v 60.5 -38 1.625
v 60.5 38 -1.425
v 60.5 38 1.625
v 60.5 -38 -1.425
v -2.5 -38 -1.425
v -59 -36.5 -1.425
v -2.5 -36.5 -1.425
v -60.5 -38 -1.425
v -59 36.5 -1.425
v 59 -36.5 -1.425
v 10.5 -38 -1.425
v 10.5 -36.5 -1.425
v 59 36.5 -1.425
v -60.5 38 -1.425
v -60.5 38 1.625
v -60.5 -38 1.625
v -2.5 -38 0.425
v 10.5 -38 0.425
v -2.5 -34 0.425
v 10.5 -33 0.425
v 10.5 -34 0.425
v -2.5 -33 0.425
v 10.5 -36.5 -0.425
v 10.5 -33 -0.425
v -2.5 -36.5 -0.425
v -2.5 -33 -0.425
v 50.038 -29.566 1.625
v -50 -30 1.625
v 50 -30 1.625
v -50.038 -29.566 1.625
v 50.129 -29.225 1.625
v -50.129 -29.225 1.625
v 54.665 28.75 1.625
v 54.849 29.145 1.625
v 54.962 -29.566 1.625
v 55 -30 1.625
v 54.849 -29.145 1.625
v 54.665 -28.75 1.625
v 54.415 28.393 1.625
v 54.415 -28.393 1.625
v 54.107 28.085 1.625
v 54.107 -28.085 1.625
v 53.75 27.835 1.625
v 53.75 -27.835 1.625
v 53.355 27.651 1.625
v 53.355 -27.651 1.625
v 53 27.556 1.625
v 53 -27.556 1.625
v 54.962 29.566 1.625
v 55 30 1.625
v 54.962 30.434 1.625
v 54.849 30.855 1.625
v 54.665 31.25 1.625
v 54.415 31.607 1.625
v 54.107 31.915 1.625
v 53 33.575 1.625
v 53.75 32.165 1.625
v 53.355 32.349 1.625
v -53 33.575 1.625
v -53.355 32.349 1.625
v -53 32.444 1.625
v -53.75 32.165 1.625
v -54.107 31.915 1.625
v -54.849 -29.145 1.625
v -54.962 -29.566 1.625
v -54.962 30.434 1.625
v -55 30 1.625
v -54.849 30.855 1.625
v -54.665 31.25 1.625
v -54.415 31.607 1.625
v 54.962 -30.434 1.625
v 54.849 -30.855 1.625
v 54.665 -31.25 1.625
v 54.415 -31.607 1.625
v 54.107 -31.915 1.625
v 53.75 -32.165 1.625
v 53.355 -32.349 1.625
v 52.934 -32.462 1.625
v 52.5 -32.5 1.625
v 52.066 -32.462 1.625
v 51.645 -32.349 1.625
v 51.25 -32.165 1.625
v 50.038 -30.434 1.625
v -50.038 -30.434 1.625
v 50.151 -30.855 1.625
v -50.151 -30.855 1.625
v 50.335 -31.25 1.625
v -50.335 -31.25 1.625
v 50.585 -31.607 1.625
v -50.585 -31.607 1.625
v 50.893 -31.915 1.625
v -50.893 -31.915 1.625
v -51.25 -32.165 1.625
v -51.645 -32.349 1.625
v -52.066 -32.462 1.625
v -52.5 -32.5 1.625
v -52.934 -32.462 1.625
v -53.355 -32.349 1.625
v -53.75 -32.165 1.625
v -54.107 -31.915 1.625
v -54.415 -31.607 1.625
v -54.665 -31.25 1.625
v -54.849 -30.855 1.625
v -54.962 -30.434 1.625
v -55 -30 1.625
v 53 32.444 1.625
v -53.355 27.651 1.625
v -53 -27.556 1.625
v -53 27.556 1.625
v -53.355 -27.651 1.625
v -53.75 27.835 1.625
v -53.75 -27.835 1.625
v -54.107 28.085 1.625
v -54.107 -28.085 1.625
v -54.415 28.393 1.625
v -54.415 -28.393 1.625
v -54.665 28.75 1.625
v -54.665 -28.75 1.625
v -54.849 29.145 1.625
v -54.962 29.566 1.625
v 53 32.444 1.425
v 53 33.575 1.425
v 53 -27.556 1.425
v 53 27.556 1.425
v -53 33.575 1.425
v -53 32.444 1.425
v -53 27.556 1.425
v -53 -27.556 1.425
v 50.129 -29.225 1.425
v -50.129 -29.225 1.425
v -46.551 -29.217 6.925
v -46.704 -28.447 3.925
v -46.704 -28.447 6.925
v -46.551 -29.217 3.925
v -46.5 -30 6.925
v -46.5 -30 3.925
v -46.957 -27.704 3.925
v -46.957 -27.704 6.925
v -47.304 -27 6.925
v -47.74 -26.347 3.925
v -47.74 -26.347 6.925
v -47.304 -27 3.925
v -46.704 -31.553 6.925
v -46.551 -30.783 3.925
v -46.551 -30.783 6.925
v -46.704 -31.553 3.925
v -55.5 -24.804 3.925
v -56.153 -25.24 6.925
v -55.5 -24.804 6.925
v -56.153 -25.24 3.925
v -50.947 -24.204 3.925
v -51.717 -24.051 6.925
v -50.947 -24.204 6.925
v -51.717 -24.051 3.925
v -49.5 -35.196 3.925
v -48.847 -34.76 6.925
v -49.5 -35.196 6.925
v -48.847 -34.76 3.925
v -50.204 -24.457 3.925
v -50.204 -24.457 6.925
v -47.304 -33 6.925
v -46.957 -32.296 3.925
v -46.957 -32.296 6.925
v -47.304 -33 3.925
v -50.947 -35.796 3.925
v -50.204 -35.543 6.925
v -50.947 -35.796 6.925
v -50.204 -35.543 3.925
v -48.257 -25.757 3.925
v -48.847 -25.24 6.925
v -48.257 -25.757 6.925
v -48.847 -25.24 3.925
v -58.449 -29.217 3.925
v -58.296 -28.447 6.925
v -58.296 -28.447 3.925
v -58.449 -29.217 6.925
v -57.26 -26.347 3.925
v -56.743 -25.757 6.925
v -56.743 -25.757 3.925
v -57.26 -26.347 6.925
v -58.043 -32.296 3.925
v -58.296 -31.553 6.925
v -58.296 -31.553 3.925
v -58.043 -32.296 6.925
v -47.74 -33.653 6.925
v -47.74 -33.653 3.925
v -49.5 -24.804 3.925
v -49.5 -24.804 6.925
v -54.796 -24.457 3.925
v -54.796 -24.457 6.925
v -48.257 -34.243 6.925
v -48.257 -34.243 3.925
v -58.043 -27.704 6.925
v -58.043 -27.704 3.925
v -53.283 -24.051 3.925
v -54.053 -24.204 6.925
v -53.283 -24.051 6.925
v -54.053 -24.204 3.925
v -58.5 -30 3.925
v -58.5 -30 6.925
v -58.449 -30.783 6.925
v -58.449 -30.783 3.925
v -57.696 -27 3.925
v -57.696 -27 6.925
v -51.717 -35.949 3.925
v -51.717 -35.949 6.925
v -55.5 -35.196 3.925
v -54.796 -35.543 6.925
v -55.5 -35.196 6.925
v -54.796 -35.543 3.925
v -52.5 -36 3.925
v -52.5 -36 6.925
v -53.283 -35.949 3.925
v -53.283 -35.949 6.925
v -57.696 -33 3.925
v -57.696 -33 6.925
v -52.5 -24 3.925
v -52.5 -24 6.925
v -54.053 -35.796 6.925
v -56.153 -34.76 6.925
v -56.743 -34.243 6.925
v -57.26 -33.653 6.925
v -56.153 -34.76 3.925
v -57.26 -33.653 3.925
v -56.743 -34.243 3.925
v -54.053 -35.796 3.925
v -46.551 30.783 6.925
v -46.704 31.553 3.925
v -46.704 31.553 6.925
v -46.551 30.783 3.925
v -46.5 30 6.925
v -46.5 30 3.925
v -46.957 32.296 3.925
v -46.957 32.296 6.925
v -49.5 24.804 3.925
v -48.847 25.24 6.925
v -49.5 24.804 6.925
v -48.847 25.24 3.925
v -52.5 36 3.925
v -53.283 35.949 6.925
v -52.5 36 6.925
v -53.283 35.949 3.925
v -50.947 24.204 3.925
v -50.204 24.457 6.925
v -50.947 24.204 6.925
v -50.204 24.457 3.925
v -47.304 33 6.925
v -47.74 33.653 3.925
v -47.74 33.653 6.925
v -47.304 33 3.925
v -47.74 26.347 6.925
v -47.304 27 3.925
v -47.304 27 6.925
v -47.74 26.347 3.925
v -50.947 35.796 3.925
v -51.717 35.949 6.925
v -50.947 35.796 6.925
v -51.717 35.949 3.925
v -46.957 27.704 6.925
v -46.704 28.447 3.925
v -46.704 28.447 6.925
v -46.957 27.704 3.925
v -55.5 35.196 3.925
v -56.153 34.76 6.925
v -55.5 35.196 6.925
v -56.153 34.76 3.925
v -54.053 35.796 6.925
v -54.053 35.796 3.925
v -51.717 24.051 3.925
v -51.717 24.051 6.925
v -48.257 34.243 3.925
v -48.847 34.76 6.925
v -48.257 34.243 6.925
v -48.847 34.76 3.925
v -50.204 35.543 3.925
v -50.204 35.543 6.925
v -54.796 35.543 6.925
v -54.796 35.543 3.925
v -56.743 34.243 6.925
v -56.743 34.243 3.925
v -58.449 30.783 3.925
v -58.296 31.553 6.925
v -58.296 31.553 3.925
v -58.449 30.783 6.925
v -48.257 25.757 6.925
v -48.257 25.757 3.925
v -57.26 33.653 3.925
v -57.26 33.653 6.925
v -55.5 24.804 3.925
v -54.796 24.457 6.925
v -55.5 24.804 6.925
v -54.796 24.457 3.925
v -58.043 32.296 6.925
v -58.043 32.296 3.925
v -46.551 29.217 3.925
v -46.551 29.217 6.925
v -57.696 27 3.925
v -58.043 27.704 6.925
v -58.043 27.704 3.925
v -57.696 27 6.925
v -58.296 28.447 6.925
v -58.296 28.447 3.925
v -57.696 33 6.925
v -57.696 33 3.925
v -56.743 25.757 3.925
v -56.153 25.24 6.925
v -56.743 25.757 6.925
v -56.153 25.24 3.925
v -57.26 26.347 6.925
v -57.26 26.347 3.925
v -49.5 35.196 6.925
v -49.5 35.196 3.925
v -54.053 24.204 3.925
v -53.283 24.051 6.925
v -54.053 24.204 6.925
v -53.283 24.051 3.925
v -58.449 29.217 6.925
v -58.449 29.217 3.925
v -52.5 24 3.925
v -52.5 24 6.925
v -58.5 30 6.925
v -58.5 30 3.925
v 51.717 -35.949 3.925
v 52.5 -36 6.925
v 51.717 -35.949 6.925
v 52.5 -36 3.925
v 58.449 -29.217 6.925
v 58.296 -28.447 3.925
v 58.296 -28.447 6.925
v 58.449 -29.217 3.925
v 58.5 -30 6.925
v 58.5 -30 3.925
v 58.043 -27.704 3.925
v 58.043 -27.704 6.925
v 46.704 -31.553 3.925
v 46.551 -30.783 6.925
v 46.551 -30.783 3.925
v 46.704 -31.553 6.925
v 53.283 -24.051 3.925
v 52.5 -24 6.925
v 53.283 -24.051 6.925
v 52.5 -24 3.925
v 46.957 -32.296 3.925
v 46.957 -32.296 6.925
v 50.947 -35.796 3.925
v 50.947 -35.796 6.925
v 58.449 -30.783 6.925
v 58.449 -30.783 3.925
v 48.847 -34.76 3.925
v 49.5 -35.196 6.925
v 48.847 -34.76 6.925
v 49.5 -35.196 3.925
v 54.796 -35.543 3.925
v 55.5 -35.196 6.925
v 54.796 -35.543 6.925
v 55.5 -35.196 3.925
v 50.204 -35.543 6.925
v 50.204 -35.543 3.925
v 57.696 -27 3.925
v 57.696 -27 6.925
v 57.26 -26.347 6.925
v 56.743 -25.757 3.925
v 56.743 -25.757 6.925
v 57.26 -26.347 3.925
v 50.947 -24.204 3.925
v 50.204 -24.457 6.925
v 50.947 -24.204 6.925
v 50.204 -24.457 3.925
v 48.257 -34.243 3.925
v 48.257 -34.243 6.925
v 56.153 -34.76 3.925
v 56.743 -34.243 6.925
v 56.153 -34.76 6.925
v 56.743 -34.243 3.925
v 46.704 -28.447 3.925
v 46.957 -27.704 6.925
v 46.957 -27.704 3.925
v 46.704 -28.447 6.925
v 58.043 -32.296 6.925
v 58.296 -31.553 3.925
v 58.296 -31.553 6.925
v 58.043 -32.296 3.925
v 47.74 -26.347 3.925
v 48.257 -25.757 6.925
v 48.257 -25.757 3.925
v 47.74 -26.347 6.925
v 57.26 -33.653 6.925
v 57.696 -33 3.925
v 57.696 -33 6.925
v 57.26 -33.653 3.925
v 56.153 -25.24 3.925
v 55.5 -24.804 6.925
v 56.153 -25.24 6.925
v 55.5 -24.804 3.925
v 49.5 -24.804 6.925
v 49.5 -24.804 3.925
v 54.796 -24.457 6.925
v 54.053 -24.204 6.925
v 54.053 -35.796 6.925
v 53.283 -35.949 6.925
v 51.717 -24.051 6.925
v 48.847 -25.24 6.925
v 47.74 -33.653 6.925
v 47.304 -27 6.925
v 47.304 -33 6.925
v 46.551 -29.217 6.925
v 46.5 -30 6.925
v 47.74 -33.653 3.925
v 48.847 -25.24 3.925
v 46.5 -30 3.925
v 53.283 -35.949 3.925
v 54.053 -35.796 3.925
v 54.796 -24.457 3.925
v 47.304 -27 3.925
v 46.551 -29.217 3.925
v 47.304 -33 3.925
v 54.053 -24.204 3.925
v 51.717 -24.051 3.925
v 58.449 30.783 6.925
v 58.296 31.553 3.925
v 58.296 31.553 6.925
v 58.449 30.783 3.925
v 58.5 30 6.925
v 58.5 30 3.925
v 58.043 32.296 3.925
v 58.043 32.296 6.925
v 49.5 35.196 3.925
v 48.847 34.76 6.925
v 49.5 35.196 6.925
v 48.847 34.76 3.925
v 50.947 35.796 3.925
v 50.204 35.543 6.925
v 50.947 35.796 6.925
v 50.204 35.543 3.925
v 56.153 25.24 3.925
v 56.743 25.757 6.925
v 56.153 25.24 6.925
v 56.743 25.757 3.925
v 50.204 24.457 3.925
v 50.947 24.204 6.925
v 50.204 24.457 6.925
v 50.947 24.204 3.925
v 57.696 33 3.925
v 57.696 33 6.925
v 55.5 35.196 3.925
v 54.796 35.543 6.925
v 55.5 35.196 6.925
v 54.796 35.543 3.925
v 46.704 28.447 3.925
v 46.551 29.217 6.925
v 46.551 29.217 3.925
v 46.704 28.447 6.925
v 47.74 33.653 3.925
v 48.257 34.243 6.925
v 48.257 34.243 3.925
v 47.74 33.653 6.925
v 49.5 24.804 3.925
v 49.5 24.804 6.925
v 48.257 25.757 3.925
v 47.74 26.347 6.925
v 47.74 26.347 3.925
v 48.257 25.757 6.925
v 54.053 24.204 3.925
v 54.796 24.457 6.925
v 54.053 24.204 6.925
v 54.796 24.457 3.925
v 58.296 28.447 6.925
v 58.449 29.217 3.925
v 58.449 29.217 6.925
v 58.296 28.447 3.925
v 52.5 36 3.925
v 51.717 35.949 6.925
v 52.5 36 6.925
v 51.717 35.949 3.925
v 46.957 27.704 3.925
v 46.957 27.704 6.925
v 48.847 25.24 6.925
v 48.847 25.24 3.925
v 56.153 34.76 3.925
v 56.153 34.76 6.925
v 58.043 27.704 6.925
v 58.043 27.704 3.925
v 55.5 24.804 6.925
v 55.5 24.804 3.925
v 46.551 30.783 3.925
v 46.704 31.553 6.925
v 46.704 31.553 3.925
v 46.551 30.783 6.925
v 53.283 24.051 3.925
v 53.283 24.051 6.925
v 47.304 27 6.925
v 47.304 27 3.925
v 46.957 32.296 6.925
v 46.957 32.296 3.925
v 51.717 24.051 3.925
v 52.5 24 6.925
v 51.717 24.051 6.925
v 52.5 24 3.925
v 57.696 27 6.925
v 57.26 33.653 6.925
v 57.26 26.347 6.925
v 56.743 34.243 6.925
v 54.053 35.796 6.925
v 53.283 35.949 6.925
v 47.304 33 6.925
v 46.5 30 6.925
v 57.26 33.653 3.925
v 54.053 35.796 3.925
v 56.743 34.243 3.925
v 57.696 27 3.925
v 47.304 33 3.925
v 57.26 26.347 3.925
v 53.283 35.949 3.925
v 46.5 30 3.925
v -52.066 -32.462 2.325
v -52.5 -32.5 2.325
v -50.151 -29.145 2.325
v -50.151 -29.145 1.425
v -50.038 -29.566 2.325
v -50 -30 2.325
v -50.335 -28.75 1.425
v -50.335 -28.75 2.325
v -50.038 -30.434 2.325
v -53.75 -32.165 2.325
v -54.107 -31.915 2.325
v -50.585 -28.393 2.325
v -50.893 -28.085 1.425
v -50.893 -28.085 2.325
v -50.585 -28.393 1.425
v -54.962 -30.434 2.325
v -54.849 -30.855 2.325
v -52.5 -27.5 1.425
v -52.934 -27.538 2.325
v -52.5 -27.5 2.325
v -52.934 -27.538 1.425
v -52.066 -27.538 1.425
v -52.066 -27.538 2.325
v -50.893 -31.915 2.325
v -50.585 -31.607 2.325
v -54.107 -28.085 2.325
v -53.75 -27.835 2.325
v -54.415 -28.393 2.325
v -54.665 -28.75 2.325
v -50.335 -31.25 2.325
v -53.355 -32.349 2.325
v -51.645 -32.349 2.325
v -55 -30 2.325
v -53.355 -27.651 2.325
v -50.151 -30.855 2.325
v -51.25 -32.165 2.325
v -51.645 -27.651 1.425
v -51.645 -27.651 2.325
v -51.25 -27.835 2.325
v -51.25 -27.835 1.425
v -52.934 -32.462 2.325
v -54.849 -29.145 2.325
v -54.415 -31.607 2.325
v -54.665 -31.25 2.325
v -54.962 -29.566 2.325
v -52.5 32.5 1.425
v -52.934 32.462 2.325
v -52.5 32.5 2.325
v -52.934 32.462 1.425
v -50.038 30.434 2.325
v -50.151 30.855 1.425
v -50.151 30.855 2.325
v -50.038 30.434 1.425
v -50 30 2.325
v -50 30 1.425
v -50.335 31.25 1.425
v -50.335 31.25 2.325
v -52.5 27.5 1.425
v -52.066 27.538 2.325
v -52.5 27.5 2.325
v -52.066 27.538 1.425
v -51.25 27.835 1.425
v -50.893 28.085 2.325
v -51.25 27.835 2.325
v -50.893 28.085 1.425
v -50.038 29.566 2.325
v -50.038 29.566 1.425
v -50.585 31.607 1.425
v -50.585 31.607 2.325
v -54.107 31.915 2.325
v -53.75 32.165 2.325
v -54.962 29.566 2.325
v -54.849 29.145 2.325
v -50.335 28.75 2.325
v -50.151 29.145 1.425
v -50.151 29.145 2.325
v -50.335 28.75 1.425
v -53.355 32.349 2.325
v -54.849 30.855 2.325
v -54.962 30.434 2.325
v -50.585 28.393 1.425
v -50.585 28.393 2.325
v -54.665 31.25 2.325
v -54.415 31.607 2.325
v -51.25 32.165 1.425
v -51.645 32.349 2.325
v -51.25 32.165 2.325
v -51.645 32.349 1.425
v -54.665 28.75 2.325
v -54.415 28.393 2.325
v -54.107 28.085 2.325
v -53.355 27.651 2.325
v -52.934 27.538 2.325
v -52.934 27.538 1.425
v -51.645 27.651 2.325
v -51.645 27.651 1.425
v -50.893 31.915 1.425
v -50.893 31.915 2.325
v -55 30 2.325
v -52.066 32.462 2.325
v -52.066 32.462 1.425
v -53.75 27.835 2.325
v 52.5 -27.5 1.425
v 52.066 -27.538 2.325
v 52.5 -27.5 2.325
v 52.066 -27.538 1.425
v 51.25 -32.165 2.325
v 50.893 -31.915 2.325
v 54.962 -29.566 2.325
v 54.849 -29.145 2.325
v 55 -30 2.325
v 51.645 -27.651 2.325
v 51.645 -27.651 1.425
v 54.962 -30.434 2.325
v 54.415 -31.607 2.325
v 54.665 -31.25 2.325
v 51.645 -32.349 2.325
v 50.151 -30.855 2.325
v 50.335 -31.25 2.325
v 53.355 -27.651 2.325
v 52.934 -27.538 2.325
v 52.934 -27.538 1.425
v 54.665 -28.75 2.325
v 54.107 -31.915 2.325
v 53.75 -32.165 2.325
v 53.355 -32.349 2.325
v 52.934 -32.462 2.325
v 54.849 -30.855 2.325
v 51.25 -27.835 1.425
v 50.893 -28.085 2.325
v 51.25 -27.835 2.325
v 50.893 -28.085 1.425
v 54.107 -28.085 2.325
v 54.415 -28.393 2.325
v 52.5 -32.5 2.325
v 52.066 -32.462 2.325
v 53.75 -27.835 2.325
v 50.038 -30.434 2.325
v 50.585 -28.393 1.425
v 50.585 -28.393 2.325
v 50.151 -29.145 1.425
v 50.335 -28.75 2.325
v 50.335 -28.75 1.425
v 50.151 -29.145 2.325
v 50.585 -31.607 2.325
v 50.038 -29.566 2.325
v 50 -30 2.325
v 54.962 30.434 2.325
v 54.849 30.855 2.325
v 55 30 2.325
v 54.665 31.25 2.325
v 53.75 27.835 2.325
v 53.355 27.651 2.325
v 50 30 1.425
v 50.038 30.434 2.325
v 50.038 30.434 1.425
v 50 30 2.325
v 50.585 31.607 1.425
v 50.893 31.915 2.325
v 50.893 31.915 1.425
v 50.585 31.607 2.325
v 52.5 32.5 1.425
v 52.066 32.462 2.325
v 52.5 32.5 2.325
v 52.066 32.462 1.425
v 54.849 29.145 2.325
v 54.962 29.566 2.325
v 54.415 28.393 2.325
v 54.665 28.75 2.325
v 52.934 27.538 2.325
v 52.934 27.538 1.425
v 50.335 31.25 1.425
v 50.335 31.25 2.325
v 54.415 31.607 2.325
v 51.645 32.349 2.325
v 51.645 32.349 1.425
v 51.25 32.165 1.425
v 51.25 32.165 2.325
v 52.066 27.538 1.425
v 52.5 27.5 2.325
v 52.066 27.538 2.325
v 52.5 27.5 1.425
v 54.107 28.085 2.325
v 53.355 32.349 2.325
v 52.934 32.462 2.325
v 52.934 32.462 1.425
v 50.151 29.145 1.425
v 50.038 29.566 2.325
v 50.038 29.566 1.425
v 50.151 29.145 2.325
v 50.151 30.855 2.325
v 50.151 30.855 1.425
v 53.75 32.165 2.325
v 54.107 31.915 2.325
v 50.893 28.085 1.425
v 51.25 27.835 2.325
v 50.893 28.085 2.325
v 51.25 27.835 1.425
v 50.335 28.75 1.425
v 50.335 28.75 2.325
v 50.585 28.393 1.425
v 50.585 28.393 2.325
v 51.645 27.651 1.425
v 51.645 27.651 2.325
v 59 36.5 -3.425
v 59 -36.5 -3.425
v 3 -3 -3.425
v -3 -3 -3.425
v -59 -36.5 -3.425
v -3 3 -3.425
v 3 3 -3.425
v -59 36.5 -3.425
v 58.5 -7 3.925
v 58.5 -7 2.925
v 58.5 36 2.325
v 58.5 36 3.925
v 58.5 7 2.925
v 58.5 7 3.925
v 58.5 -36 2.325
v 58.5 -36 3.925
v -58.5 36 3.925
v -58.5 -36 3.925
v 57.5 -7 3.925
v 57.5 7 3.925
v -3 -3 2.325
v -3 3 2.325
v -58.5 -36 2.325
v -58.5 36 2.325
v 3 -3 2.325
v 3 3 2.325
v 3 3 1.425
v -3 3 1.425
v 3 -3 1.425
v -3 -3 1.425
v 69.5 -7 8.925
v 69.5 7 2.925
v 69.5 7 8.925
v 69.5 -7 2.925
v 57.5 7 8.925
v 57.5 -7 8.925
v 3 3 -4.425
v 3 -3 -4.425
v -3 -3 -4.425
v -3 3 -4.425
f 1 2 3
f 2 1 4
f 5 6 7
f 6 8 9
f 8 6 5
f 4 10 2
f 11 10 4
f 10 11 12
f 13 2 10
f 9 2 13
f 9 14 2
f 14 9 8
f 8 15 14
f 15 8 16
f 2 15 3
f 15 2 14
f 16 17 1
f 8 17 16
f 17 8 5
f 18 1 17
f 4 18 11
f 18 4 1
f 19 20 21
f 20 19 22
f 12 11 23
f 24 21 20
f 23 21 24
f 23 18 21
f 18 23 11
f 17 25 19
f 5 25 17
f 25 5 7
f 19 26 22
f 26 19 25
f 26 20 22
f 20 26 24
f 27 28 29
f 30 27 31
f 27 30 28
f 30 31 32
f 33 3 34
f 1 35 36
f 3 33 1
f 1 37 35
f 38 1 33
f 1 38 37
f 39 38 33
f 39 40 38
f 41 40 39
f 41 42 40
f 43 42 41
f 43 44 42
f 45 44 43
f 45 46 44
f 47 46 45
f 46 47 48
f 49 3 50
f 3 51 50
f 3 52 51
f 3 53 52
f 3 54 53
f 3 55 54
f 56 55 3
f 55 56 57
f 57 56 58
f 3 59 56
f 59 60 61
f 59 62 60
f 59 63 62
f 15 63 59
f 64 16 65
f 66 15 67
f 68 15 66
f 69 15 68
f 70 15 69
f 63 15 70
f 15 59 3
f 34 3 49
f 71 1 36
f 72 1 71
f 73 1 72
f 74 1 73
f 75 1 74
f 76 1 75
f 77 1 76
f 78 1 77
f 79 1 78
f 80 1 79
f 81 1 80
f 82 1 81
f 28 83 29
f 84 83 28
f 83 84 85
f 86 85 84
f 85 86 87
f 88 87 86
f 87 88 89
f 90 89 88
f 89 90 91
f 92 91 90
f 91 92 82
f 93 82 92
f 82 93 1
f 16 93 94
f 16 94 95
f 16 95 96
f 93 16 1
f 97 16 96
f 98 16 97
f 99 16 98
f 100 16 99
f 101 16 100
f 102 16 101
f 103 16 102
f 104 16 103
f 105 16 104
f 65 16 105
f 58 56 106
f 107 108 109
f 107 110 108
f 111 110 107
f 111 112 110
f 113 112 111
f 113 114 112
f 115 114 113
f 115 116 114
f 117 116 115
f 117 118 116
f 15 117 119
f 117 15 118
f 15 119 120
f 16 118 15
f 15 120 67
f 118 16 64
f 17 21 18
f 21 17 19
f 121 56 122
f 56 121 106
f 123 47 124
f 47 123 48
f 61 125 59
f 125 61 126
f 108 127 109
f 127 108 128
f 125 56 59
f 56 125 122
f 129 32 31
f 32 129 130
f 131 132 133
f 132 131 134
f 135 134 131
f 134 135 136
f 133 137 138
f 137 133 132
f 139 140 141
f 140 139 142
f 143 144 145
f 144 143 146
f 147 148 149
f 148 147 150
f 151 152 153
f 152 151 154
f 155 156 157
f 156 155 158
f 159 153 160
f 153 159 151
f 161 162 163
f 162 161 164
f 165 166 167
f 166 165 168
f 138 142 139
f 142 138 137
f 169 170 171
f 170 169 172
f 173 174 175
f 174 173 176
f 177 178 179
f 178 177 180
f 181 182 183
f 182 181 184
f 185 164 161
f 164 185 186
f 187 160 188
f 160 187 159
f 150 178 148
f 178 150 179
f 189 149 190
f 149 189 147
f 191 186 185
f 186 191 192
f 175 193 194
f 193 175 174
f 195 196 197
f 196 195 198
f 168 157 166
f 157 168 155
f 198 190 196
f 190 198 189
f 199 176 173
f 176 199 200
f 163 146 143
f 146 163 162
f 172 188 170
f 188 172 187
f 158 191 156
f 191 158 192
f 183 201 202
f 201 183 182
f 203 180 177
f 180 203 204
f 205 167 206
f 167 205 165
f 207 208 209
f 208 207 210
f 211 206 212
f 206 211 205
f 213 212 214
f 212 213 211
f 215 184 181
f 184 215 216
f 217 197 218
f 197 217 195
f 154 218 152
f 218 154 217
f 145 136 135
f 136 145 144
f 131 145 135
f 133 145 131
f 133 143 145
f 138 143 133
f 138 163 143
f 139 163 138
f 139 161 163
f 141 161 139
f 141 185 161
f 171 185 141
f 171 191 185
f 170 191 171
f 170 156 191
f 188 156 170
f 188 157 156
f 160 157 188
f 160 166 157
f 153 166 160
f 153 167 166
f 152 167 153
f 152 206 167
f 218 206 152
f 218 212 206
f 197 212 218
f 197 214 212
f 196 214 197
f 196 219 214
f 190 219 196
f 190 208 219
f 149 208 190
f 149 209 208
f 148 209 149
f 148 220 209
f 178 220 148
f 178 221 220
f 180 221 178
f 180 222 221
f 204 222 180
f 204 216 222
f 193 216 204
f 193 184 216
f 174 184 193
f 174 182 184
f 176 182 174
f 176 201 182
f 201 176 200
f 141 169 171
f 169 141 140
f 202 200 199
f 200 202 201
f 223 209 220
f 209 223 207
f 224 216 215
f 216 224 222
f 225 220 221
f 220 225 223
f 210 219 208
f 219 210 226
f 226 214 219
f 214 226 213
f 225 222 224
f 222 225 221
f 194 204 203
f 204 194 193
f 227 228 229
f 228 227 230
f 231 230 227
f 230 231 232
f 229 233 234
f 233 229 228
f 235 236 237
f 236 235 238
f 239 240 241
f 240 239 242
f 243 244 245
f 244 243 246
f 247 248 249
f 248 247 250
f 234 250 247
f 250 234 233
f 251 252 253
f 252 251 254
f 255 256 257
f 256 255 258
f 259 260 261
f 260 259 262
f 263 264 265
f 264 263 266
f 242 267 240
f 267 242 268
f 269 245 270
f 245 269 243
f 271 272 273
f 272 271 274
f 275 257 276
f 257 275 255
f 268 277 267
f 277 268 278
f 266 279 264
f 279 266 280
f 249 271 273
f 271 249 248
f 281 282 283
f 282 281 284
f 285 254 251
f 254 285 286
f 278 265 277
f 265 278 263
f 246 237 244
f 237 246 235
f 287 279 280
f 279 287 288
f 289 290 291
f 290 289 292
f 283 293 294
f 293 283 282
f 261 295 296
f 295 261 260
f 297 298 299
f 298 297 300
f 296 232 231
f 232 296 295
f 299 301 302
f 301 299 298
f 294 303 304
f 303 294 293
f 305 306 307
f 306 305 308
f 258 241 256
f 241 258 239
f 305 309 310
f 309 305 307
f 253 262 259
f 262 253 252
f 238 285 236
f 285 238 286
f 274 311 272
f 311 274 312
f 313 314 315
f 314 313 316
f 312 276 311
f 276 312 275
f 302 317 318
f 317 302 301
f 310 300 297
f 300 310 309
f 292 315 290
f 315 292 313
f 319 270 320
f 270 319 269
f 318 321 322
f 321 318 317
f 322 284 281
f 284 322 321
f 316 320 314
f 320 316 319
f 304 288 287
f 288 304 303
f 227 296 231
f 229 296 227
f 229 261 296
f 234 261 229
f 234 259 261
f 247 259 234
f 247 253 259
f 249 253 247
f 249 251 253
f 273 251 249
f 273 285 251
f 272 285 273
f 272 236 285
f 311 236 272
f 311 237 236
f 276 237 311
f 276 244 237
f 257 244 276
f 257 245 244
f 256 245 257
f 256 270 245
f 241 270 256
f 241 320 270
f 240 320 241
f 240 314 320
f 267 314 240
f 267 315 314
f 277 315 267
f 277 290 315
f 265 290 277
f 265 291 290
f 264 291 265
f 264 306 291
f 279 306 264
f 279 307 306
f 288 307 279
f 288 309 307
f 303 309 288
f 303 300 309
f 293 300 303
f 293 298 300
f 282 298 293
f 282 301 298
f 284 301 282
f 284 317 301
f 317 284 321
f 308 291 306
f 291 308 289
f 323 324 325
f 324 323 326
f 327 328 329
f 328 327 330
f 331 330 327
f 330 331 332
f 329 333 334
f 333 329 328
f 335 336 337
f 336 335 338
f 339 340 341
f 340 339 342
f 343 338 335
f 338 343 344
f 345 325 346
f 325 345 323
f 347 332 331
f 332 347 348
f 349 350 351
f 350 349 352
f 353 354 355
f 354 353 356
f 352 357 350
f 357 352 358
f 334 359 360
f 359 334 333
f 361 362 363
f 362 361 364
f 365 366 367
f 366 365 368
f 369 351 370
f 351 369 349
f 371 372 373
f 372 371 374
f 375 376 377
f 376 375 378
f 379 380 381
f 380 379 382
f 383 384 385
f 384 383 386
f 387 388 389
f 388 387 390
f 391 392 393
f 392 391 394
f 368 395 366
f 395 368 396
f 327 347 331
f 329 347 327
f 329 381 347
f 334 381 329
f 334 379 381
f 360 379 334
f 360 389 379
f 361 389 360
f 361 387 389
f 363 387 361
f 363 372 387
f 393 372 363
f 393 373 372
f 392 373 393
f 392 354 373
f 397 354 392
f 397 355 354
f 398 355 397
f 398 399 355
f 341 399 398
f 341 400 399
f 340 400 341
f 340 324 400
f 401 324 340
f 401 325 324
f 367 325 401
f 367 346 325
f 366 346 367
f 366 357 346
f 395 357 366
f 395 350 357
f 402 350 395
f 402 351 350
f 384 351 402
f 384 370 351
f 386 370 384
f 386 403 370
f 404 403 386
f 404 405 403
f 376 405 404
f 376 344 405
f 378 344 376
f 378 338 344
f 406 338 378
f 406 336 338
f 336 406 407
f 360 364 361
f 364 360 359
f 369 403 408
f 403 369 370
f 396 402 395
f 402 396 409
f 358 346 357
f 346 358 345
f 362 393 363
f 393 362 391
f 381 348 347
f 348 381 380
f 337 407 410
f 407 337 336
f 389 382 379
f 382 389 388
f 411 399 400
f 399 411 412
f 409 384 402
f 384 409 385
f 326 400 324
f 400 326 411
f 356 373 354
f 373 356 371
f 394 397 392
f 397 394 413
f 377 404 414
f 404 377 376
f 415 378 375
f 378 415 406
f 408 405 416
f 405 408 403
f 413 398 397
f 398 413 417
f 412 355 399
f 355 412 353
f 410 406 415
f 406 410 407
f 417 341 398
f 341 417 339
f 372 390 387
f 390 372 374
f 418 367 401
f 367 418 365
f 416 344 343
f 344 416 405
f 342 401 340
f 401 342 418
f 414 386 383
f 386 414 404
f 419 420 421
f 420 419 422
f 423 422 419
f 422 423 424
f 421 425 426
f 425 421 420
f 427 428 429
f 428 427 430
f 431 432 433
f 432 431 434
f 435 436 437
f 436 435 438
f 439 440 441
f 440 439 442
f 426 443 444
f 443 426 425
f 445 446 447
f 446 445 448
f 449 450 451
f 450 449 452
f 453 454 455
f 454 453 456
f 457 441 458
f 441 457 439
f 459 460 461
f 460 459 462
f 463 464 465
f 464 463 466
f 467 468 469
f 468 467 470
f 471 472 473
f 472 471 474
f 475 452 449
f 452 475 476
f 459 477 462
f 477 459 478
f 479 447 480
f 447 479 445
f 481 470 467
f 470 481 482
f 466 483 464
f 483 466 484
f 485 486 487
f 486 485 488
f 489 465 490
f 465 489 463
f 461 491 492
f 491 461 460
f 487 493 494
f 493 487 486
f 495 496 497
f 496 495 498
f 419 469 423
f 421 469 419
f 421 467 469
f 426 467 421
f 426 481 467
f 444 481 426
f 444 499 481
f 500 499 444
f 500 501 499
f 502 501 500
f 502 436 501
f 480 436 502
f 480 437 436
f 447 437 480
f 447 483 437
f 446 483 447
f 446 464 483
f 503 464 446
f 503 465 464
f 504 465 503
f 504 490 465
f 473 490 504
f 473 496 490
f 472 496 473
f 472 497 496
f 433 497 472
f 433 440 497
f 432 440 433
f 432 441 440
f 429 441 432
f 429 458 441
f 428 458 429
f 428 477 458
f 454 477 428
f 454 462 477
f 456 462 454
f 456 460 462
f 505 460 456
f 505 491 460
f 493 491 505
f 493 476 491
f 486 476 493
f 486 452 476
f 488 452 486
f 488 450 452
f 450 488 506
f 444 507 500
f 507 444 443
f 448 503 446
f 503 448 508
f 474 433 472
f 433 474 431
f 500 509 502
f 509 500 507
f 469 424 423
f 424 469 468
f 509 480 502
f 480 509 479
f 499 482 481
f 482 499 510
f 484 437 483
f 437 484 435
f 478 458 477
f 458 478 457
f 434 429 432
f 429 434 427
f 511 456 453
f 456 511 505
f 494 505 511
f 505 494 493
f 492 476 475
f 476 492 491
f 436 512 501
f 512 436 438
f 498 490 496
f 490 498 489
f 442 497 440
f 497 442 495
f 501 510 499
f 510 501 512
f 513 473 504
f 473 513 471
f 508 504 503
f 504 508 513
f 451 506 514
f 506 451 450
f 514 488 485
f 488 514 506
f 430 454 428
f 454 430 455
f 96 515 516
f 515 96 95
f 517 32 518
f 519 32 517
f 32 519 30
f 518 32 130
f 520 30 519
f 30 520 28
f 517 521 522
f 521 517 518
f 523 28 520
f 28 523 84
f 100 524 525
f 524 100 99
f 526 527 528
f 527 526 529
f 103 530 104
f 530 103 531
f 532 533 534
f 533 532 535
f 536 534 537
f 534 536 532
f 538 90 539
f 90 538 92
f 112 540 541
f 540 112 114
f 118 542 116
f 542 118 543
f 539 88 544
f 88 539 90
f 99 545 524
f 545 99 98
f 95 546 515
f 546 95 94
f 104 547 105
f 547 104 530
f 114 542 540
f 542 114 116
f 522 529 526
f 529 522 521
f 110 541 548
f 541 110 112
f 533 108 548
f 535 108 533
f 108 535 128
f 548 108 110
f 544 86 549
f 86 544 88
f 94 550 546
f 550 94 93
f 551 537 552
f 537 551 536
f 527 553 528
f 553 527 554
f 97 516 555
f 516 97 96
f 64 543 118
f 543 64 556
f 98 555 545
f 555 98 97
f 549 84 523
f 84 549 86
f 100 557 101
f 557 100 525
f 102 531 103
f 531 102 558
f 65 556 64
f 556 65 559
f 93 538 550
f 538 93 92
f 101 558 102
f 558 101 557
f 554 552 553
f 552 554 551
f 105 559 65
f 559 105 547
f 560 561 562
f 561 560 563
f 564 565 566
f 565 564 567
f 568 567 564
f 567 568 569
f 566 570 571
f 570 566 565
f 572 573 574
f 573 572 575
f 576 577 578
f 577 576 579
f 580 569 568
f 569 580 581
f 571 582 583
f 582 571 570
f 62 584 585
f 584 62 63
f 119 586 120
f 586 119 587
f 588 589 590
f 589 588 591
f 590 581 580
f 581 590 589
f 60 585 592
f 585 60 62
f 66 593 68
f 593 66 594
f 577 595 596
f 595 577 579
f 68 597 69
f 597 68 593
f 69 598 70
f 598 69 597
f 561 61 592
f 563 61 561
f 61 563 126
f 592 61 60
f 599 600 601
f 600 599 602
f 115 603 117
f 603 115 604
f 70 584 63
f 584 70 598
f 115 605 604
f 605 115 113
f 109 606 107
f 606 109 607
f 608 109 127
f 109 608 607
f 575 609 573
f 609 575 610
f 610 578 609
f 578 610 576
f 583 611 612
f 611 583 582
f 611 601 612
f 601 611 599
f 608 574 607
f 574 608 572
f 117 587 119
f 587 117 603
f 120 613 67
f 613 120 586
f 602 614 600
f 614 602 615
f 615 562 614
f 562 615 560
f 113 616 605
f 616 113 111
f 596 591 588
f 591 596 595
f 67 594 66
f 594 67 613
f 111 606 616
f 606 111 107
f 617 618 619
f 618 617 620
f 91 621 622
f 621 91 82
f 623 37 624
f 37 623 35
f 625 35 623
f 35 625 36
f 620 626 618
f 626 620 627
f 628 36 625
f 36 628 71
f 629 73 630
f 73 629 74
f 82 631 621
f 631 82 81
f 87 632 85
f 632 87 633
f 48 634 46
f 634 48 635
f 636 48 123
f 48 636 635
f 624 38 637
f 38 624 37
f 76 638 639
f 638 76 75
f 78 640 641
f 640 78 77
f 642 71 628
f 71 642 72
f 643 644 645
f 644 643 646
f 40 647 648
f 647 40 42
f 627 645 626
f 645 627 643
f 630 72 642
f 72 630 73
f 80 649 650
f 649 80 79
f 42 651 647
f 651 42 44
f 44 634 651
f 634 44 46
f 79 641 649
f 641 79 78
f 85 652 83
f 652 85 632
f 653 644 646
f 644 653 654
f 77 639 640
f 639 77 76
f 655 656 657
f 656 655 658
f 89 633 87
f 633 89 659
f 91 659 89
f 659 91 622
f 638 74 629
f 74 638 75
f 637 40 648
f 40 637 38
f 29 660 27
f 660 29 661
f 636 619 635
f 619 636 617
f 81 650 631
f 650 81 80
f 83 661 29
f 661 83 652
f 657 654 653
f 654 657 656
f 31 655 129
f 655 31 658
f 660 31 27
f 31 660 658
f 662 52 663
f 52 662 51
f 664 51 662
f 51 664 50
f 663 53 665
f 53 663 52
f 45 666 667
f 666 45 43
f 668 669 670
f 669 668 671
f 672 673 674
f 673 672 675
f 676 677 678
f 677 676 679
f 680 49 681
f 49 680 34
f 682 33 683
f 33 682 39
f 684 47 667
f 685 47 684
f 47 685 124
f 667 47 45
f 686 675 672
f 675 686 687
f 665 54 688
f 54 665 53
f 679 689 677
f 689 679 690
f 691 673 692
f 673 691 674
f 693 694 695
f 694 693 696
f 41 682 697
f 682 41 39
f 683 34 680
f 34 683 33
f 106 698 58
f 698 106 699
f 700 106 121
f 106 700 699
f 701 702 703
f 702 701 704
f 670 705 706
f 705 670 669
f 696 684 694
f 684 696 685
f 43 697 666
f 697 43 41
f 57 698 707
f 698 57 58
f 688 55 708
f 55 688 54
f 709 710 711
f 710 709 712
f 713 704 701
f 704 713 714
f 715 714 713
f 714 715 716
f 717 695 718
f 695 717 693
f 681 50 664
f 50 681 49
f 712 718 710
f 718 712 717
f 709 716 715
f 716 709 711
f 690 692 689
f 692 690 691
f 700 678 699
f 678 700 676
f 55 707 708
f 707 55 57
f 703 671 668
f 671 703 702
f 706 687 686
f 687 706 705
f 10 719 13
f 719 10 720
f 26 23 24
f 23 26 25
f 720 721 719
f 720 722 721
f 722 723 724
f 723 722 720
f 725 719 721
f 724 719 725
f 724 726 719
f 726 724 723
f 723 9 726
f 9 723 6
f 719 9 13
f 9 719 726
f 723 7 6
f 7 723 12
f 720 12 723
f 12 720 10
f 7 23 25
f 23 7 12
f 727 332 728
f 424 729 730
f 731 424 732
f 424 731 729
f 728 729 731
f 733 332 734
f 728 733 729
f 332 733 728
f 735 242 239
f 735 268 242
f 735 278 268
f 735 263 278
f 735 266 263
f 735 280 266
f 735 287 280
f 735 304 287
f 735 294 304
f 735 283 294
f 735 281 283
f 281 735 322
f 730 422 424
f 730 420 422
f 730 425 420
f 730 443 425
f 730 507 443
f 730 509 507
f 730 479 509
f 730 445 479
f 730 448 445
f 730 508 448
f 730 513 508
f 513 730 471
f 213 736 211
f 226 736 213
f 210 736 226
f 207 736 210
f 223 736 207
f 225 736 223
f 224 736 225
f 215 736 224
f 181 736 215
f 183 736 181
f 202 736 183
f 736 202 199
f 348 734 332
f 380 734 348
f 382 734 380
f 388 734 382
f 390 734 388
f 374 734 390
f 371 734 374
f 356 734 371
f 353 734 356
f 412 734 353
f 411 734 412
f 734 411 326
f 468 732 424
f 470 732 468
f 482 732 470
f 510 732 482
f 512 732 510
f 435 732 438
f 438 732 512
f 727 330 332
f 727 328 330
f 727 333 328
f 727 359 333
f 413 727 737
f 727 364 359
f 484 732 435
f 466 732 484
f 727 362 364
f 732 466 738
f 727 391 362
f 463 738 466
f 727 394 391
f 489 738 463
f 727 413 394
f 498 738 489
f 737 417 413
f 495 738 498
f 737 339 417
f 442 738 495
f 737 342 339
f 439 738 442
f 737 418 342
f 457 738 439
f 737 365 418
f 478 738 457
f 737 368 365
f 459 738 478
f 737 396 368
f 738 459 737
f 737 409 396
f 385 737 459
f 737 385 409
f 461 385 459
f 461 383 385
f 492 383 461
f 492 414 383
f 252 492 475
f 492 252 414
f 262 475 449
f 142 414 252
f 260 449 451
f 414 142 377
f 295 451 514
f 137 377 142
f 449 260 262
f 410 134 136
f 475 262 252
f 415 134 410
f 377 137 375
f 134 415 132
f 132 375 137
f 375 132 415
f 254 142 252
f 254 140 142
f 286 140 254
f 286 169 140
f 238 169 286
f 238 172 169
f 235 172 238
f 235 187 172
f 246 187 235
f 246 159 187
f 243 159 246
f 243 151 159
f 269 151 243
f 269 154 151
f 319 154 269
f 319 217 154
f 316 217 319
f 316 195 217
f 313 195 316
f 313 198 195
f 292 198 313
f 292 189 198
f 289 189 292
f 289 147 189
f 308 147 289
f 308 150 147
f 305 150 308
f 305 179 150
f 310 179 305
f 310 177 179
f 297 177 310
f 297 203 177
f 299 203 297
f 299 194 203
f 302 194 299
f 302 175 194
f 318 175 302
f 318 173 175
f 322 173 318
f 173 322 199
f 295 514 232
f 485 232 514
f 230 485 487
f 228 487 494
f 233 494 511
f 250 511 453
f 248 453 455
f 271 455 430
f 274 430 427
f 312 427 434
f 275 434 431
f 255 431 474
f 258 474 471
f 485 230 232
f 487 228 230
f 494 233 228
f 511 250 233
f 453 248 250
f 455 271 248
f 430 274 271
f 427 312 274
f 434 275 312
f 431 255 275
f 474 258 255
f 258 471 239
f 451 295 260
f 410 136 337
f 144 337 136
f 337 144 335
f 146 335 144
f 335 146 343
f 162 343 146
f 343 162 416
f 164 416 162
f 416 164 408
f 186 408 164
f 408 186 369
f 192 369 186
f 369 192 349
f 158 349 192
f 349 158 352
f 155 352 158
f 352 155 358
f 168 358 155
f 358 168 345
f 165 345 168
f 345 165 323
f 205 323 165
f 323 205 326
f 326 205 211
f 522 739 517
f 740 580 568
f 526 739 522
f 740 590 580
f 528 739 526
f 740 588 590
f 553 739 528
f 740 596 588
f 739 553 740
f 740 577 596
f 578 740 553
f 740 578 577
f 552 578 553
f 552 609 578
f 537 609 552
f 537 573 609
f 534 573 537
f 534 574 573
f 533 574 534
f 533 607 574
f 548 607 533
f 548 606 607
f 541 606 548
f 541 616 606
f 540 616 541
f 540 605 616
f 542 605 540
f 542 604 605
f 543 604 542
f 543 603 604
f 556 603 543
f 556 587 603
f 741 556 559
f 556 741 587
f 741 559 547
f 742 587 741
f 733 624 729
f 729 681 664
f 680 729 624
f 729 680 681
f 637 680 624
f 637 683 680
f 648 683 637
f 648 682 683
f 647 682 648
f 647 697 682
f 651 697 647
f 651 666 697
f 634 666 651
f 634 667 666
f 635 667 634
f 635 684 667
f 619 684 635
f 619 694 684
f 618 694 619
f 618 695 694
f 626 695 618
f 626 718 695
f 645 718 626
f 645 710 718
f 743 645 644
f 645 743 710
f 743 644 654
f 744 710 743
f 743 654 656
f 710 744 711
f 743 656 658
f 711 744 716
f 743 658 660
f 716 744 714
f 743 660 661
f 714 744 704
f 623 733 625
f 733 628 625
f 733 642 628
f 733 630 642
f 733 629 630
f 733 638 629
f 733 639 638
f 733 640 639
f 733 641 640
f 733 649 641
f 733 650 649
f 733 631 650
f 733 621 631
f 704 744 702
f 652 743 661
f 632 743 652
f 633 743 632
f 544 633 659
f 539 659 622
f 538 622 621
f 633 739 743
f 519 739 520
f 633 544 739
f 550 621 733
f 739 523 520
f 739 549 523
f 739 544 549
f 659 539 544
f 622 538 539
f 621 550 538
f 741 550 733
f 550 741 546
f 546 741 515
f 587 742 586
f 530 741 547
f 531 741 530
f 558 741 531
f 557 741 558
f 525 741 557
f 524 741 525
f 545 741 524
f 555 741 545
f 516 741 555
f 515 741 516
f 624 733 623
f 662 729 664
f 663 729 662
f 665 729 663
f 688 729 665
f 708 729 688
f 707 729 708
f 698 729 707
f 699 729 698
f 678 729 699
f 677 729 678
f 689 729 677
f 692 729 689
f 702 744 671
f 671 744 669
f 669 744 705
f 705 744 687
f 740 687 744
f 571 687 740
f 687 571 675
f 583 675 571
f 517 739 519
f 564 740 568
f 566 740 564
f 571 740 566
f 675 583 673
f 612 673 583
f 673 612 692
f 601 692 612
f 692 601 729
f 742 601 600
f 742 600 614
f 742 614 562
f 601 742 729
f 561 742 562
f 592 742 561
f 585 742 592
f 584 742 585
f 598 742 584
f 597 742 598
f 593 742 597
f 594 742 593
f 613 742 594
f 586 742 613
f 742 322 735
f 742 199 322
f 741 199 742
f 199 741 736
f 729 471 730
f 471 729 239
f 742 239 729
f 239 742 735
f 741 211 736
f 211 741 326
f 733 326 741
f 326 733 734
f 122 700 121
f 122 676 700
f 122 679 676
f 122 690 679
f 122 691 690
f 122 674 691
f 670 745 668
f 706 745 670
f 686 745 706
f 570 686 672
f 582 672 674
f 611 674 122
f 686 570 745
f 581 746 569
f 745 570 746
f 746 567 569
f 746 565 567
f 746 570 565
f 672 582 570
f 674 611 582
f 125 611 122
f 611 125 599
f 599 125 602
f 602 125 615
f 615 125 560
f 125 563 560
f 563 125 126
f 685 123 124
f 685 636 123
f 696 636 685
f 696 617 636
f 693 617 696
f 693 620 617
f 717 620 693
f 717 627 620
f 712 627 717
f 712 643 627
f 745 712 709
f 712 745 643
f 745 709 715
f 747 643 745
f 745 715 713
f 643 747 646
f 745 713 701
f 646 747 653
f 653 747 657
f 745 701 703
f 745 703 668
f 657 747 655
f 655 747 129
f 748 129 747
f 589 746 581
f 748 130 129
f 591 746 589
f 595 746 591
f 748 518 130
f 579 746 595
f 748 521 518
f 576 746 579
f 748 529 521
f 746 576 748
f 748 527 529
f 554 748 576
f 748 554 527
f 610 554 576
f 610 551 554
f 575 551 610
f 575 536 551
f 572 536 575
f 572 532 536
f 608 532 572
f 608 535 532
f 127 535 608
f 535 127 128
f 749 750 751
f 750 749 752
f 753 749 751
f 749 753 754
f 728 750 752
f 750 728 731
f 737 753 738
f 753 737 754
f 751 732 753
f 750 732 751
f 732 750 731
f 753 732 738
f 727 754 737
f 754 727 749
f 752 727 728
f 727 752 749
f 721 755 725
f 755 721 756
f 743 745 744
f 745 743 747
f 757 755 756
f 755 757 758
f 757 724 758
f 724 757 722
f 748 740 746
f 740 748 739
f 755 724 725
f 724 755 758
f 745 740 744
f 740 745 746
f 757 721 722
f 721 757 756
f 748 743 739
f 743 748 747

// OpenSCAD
// HDMI display 5" module (ONE connected solid)
// Spec: 121, 76, 2.85, , [0, 0, 1.9], // pcb offst
//       [[-54, -30.225], [54, 34.575, 0.5]], // aperture
//       [[-58.7, -34], [58.7, 36.25, 1]], // touch screen
//       2, // thread length
//       [[-2.5, -39], [10.5, -33]], // clearance need for the ts ribbon

// ---------------- Parameters ----------------
display_overall_width_mm  = 121;
display_overall_height_mm = 76;
display_thickness_mm      = 2.85;

pcb_offset_x_mm = 0;
pcb_offset_y_mm = 0;
pcb_offset_z_mm = 1.9;

display_aperture_min_x_mm = -54;
display_aperture_min_y_mm = -30.225;
display_aperture_max_x_mm =  54;
display_aperture_max_y_mm =  34.575;
display_aperture_depth_mm = 0.5;

touch_min_x_mm = -58.7;
touch_min_y_mm = -34;
touch_max_x_mm =  58.7;
touch_max_y_mm =  36.25;
touch_thickness_mm = 1;

thread_length_mm = 2;

ts_ribbon_min_x_mm = -2.5;
ts_ribbon_min_y_mm = -39;
ts_ribbon_max_x_mm = 10.5;
ts_ribbon_max_y_mm = -33;
ts_ribbon_clearance_depth_mm = 2.5;

pcb_interface_thickness_mm = 1.6;
pcb_interface_margin_mm    = 2;

mount_post_radius_mm   = 2.5;
mount_post_inset_x_mm  = 8;
mount_post_inset_y_mm  = 8;

hdmi_width_mm  = 14;
hdmi_height_mm = 6;
hdmi_depth_mm  = 12;
hdmi_side_offset_y_mm = 0;

knob_radius_mm = 6;
knob_height_mm = 4;

overlap_mm = 1;

// Ensure the "display module" reads as a stack (not a single thin board)
backer_thickness_mm = 3.0;   // rear housing/backer (visual mass)
bezel_thickness_mm  = 1.2;   // front bezel ring thickness (around aperture)
bezel_lip_mm         = 1.0;  // bezel overlap into aperture opening

// ---------------- Helpers ----------------
function mid(a,b)  = (a+b)/2;
function span(a,b) = (b-a);

ap_cx = mid(display_aperture_min_x_mm, display_aperture_max_x_mm);
ap_cy = mid(display_aperture_min_y_mm, display_aperture_max_y_mm);
ap_w  = span(display_aperture_min_x_mm, display_aperture_max_x_mm);
ap_h  = span(display_aperture_min_y_mm, display_aperture_max_y_mm);

ts_cx = mid(touch_min_x_mm, touch_max_x_mm);
ts_cy = mid(touch_min_y_mm, touch_max_y_mm);
ts_w  = span(touch_min_x_mm, touch_max_x_mm);
ts_h  = span(touch_min_y_mm, touch_max_y_mm);

rb_cx = mid(ts_ribbon_min_x_mm, ts_ribbon_max_x_mm);
rb_cy = mid(ts_ribbon_min_y_mm, ts_ribbon_max_y_mm);
rb_w  = span(ts_ribbon_min_x_mm, ts_ribbon_max_x_mm);
rb_h  = span(ts_ribbon_min_y_mm, ts_ribbon_max_y_mm);

// Z stack (centered assembly around Z=0)
z_display_center = 0;
z_display_top    = z_display_center + display_thickness_mm/2;
z_display_bot    = z_display_center - display_thickness_mm/2;

z_touch_center = z_display_top + touch_thickness_mm/2 - overlap_mm;
z_touch_top    = z_touch_center + touch_thickness_mm/2;

z_pcb_center = z_display_top + pcb_offset_z_mm + pcb_interface_thickness_mm/2 - overlap_mm;
z_pcb_top    = z_pcb_center + pcb_interface_thickness_mm/2;
z_pcb_bot    = z_pcb_center - pcb_interface_thickness_mm/2;

z_knob_center = z_pcb_top + knob_height_mm/2 - overlap_mm;

z_backer_center = z_display_bot - backer_thickness_mm/2 + overlap_mm;
z_backer_bot    = z_backer_center - backer_thickness_mm/2;

z_bezel_center  = z_touch_top + bezel_thickness_mm/2 - overlap_mm;

// ---------------- Geometry modules ----------------
module display_core_with_recesses() {
  // Core slab with:
  // - aperture recess on front
  // - ribbon clearance pocket on front (per spec)
  difference() {
    cube([display_overall_width_mm, display_overall_height_mm, display_thickness_mm], center=true);

    // Aperture recess (front/top face)
    translate([ap_cx, ap_cy, z_display_top - display_aperture_depth_mm/2])
      cube([ap_w, ap_h, display_aperture_depth_mm + overlap_mm], center=true);

    // Ribbon clearance pocket (front/top face, near bottom edge per spec)
    translate([rb_cx, rb_cy, z_display_top - ts_ribbon_clearance_depth_mm/2])
      cube([rb_w, rb_h, ts_ribbon_clearance_depth_mm + overlap_mm], center=true);
  }
}

module front_bezel_ring() {
  // Bezel ring around the aperture to make the "display opening" visible.
  // Outer = overall display face; Inner = aperture opening (slightly smaller to create a lip).
  inner_w = max(0.1, ap_w - 2*bezel_lip_mm);
  inner_h = max(0.1, ap_h - 2*bezel_lip_mm);

  translate([0, 0, z_bezel_center])
    difference() {
      cube([display_overall_width_mm, display_overall_height_mm, bezel_thickness_mm], center=true);
      translate([ap_cx, ap_cy, 0])
        cube([inner_w, inner_h, bezel_thickness_mm + 2*overlap_mm], center=true);
    }
}

module backer_body() {
  // Rear housing/backer to give the module thickness/recognizable body.
  // Keep it slightly inset so it reads as a back housing.
  backer_w = display_overall_width_mm - 2*1.5;
  backer_h = display_overall_height_mm - 2*1.5;

  translate([0, 0, z_backer_center])
    cube([backer_w, backer_h, backer_thickness_mm], center=true);
}

module pcb_plate() {
  translate([pcb_offset_x_mm, pcb_offset_y_mm, z_pcb_center])
    cube([display_overall_width_mm - 2*pcb_interface_margin_mm,
          display_overall_height_mm - 2*pcb_interface_margin_mm,
          pcb_interface_thickness_mm], center=true);
}

module touchscreen_glass() {
  // Touchscreen volume on top/front side (outer dimensions per spec)
  translate([ts_cx, ts_cy, z_touch_center])
    cube([ts_w, ts_h, touch_thickness_mm], center=true);
}

module hdmi_connector() {
  // Place on right edge of PCB, connected with overlap
  pcb_w = display_overall_width_mm - 2*pcb_interface_margin_mm;

  x_center = pcb_offset_x_mm + pcb_w/2 + hdmi_depth_mm/2 - overlap_mm; // protrude out from PCB edge
  y_center = pcb_offset_y_mm + hdmi_side_offset_y_mm;
  z_center = z_pcb_center + pcb_interface_thickness_mm/2 + hdmi_height_mm/2 - overlap_mm;

  translate([x_center, y_center, z_center])
    cube([hdmi_depth_mm, hdmi_width_mm, hdmi_height_mm], center=true);
}

module mounting_knobs() {
  // Four knobs/posts on top of PCB (connected)
  for (ix = [-1, 1])
    for (iy = [-1, 1]) {
      x = ix * (display_overall_width_mm/2 - mount_post_inset_x_mm);
      y = iy * (display_overall_height_mm/2 - mount_post_inset_y_mm);
      translate([x, y, z_knob_center])
        cylinder(r=knob_radius_mm, h=knob_height_mm, center=true, $fn=48);
    }
}

module thread_stubs() {
  // Small stubs under PCB at the same XY as knobs to represent thread length (connected)
  z_stub_center = z_pcb_bot - thread_length_mm/2 + overlap_mm;
  for (ix = [-1, 1])
    for (iy = [-1, 1]) {
      x = ix * (display_overall_width_mm/2 - mount_post_inset_x_mm);
      y = iy * (display_overall_height_mm/2 - mount_post_inset_y_mm);
      translate([x, y, z_stub_center])
        cylinder(r=mount_post_radius_mm, h=thread_length_mm, center=true, $fn=36);
    }
}

module keepout_bridge_to_ensure_connectivity() {
  // Ensure the bezel/touch/core/backer/pcb are all one connected solid even if
  // parameters are edited later. This is a thin internal "spine" that overlaps
  // all layers without changing the external silhouette.
  spine_w = 6;
  spine_h = 6;
  z_top = z_bezel_center + bezel_thickness_mm/2;
  z_bot = z_backer_bot;
  spine_zc = (z_top + z_bot)/2;
  spine_zh = (z_top - z_bot) + 2*overlap_mm;

  translate([0, 0, spine_zc])
    cube([spine_w, spine_h, spine_zh], center=true);
}

// ---------------- Assembly (ONE connected solid) ----------------
union() {
  display_core_with_recesses();
  front_bezel_ring();
  backer_body();
  pcb_plate();
  touchscreen_glass();
  hdmi_connector();
  mounting_knobs();
  thread_stubs();
  keepout_bridge_to_ensure_connectivity();
}
